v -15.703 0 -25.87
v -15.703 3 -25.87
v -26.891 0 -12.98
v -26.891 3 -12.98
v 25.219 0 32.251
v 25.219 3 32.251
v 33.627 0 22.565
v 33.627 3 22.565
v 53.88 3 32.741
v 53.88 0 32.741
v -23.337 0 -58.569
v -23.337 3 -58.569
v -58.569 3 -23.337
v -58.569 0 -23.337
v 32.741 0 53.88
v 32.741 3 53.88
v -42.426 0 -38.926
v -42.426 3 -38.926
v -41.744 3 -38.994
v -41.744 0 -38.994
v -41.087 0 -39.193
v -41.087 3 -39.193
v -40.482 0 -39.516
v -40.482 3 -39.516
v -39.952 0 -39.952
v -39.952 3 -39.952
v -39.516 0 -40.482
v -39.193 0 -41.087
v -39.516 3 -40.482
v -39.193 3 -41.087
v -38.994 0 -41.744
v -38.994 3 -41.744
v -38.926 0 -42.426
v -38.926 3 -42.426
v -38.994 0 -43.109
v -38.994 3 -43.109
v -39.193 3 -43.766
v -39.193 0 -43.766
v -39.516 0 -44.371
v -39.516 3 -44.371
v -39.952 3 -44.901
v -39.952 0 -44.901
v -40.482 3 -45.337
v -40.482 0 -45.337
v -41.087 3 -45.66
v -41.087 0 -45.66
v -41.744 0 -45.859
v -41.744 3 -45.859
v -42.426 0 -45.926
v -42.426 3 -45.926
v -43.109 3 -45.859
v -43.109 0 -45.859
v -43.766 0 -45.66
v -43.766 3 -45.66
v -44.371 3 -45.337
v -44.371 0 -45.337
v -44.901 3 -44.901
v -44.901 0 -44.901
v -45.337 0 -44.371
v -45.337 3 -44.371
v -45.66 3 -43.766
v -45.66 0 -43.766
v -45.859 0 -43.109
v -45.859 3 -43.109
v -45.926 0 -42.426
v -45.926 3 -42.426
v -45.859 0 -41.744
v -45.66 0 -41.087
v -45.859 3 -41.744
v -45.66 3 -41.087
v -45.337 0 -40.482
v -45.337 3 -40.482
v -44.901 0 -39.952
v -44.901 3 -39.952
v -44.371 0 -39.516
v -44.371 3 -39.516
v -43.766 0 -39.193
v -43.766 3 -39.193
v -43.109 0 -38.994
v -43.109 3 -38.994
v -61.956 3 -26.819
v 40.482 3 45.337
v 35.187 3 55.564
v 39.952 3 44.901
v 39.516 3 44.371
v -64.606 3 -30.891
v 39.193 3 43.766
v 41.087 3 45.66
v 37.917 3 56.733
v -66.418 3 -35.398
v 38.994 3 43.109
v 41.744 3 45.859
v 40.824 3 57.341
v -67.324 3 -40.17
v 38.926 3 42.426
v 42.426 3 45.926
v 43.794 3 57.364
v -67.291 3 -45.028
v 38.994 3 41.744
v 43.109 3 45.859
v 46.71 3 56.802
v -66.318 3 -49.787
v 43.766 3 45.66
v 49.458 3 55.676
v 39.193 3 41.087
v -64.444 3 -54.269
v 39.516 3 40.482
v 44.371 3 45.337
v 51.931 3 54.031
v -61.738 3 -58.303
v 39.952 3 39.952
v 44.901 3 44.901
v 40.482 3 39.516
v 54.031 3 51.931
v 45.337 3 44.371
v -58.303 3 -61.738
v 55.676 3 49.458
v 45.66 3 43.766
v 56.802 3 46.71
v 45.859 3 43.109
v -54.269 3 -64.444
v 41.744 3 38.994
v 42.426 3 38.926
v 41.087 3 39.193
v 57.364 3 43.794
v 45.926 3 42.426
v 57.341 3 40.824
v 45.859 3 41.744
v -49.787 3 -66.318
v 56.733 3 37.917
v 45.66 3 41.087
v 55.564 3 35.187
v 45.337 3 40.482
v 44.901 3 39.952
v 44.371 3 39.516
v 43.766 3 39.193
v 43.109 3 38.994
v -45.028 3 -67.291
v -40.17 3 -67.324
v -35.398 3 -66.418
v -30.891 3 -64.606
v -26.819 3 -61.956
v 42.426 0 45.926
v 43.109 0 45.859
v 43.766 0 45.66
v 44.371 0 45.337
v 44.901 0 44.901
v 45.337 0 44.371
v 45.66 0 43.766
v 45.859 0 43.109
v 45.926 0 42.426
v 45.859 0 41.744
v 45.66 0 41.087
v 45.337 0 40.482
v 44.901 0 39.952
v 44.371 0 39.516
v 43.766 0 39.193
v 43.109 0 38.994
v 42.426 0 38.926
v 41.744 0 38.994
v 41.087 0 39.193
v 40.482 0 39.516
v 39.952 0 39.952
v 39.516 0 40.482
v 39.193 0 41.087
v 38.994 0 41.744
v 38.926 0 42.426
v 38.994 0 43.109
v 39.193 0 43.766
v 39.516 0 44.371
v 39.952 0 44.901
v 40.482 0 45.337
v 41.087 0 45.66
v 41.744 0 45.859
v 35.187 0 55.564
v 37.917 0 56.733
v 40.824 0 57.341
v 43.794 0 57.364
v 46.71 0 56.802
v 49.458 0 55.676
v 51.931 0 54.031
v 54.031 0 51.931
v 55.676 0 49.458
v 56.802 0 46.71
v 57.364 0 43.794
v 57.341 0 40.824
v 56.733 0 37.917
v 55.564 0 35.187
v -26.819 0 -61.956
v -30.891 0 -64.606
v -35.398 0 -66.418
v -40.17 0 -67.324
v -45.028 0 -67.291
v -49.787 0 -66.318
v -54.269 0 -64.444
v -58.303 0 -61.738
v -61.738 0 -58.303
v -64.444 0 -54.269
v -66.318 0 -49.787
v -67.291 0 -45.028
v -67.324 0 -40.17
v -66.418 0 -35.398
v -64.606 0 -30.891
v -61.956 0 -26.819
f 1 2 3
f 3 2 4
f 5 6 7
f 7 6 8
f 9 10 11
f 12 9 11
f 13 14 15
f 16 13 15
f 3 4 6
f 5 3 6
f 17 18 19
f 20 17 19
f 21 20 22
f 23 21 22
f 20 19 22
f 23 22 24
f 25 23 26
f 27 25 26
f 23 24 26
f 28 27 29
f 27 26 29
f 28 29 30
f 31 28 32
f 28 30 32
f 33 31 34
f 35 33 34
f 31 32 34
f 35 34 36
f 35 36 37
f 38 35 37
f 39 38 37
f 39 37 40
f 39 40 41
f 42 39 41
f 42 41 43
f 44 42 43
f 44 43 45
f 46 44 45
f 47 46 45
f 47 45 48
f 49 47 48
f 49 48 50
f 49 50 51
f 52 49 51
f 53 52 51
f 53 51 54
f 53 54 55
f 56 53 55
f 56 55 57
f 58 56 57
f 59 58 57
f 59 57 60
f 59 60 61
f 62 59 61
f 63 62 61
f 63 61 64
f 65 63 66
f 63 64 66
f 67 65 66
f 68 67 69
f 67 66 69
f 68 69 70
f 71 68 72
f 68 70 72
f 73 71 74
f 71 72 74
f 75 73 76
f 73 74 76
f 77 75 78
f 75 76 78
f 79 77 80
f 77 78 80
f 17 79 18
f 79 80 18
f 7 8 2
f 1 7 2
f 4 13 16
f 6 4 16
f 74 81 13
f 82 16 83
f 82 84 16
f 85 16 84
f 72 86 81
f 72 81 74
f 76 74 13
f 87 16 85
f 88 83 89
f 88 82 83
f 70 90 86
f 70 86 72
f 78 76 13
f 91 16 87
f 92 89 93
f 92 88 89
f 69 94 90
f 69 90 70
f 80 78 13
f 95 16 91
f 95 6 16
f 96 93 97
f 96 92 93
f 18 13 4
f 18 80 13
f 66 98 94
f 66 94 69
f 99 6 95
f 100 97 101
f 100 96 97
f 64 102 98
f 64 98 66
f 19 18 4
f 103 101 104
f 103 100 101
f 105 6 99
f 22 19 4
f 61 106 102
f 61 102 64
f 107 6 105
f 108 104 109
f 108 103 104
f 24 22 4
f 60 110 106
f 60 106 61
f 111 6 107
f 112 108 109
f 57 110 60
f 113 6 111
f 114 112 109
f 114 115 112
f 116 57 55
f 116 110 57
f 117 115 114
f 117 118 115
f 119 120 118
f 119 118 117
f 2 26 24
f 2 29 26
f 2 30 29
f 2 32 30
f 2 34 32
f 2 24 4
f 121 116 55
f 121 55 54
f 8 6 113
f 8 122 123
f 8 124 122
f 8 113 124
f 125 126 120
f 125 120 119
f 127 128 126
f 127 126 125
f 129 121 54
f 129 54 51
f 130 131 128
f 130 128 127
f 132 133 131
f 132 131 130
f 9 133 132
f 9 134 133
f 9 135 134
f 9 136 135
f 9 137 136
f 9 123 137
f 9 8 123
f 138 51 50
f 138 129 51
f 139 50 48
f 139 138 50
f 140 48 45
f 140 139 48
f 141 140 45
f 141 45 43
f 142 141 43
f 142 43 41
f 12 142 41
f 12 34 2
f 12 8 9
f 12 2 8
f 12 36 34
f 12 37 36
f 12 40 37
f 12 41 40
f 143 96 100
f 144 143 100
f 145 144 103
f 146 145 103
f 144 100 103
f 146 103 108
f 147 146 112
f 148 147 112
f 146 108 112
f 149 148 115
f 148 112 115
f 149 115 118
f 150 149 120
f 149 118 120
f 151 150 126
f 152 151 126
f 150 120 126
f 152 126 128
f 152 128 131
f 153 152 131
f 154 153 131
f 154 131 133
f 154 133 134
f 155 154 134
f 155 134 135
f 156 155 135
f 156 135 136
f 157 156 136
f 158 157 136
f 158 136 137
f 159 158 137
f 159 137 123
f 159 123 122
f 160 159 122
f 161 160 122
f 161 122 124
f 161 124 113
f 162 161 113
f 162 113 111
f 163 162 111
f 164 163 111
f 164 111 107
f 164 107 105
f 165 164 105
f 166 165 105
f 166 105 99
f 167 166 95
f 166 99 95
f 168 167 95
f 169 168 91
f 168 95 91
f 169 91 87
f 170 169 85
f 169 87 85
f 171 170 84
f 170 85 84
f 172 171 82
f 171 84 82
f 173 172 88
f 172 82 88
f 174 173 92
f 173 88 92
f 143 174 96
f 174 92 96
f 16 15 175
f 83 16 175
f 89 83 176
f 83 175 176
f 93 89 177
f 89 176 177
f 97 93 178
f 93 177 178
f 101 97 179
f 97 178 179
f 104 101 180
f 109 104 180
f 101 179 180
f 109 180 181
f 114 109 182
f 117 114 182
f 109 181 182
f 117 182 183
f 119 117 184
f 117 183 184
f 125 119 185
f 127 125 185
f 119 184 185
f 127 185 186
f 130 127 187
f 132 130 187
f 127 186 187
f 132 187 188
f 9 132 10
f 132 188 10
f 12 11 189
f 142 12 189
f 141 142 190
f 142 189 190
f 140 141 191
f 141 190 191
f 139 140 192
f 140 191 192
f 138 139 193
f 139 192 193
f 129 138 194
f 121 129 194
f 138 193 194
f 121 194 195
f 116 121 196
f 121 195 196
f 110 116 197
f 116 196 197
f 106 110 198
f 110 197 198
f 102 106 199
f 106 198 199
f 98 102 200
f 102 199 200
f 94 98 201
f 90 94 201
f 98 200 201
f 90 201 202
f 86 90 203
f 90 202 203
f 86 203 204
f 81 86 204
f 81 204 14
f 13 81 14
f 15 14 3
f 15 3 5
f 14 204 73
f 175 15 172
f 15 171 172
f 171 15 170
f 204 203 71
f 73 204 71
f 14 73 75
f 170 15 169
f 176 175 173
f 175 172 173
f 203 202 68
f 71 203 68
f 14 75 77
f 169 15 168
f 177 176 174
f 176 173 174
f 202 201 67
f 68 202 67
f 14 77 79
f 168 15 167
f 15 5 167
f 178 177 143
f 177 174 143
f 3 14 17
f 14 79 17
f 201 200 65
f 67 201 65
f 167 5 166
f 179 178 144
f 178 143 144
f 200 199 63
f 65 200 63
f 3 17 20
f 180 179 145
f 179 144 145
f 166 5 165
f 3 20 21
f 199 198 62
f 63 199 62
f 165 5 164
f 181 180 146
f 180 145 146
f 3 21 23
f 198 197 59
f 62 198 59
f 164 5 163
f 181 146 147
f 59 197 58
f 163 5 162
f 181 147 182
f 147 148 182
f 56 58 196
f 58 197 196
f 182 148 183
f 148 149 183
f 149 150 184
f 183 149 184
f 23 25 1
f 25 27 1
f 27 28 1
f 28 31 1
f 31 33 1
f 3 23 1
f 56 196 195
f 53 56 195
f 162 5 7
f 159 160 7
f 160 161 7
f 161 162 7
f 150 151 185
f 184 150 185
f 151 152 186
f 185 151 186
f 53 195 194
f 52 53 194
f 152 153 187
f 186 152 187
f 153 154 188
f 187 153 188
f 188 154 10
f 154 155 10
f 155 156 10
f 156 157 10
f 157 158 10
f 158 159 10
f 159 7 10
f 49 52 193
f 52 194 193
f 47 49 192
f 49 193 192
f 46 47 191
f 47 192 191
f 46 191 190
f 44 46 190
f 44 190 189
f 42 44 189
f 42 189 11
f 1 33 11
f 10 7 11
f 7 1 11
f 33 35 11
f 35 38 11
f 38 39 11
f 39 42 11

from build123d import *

# Parameters (mm, degrees)
EXTRUDE_2_DEPTH     = 3
SKETCH_4_R          = 2.25
SKETCH_4_R_2        = 2.5
CUT_EXTRUDE_2_DEPTH = 96.402519291
SKETCH_6_R          = 3.5
CUT_EXTRUDE_3_DEPTH = 96.402519291
SKETCH_7_R          = 3.5
CUT_EXTRUDE_4_DEPTH = 96.402519291
CUT_EXTRUDE_5_DEPTH = 96.402519291


with BuildPart() as part:
    # 草图2 → 凸台-拉伸2 (new body)
    with BuildSketch(Plane(origin=(0, 0, 0), x_dir=(1, 0, 0), z_dir=(0, 1, 0))):
        with BuildLine():
            Line((-58.569449541, 23.337085947), (32.740581269, -53.879999426))
            ThreePointArc((32.740581269, -53.879999426), (53.033008589, -53.033008589), (53.879999426, -32.740581269))
            Line((53.879999426, -32.740581269), (-23.337085947, 58.569449541))
            ThreePointArc((-23.337085947, 58.569449541), (-60.104076401, 60.104076401), (-58.569449541, 23.337085947))
        make_face()
    extrude(amount=EXTRUDE_2_DEPTH)

    # 草图4 → 切除-拉伸2 (cut, through all)
    with BuildSketch(Plane(origin=(0, 3, 0), x_dir=(1, 0, 0), z_dir=(0, 1, 0))):
        with Locations(Location((-42.426406871, 42.426406871, 0), (0, 0, 270))):
            Circle(SKETCH_4_R)
        with Locations(Location((42.426406871, -42.426406871, 0), (0, 0, 270))):
            Circle(SKETCH_4_R_2)
    extrude(amount=-CUT_EXTRUDE_2_DEPTH, mode=Mode.SUBTRACT)

    # 草图6 → 切除-拉伸3 (cut, through all)
    with BuildSketch(Plane(origin=(0, 3, 0), x_dir=(1, 0, 0), z_dir=(0, 1, 0))):
        with Locations(Location((-42.426406871, 42.426406871, 0), (0, 0, 270))):
            Circle(SKETCH_6_R)
    extrude(amount=-CUT_EXTRUDE_3_DEPTH, mode=Mode.SUBTRACT)

    # 草图7 → 切除-拉伸4 (cut, through all)
    with BuildSketch(Plane(origin=(0, 3, 0), x_dir=(1, 0, 0), z_dir=(0, 1, 0))):
        with Locations(Location((42.426406871, -42.426406871, 0), (0, 0, 270))):
            Circle(SKETCH_7_R)
    extrude(amount=-CUT_EXTRUDE_4_DEPTH, mode=Mode.SUBTRACT)

    # 草图8 → 切除-拉伸5 (cut, through all)
    with BuildSketch(Plane(origin=(0, 3, 0), x_dir=(1, 0, 0), z_dir=(0, 1, 0))):
        Polygon((33.626672858, -22.564710472), (-15.702999665, 25.870376375), (-26.891422763, 12.98046534), (25.218843822, -32.251166492), align=None)
    extrude(amount=-CUT_EXTRUDE_5_DEPTH, mode=Mode.SUBTRACT)


solid = part.part
